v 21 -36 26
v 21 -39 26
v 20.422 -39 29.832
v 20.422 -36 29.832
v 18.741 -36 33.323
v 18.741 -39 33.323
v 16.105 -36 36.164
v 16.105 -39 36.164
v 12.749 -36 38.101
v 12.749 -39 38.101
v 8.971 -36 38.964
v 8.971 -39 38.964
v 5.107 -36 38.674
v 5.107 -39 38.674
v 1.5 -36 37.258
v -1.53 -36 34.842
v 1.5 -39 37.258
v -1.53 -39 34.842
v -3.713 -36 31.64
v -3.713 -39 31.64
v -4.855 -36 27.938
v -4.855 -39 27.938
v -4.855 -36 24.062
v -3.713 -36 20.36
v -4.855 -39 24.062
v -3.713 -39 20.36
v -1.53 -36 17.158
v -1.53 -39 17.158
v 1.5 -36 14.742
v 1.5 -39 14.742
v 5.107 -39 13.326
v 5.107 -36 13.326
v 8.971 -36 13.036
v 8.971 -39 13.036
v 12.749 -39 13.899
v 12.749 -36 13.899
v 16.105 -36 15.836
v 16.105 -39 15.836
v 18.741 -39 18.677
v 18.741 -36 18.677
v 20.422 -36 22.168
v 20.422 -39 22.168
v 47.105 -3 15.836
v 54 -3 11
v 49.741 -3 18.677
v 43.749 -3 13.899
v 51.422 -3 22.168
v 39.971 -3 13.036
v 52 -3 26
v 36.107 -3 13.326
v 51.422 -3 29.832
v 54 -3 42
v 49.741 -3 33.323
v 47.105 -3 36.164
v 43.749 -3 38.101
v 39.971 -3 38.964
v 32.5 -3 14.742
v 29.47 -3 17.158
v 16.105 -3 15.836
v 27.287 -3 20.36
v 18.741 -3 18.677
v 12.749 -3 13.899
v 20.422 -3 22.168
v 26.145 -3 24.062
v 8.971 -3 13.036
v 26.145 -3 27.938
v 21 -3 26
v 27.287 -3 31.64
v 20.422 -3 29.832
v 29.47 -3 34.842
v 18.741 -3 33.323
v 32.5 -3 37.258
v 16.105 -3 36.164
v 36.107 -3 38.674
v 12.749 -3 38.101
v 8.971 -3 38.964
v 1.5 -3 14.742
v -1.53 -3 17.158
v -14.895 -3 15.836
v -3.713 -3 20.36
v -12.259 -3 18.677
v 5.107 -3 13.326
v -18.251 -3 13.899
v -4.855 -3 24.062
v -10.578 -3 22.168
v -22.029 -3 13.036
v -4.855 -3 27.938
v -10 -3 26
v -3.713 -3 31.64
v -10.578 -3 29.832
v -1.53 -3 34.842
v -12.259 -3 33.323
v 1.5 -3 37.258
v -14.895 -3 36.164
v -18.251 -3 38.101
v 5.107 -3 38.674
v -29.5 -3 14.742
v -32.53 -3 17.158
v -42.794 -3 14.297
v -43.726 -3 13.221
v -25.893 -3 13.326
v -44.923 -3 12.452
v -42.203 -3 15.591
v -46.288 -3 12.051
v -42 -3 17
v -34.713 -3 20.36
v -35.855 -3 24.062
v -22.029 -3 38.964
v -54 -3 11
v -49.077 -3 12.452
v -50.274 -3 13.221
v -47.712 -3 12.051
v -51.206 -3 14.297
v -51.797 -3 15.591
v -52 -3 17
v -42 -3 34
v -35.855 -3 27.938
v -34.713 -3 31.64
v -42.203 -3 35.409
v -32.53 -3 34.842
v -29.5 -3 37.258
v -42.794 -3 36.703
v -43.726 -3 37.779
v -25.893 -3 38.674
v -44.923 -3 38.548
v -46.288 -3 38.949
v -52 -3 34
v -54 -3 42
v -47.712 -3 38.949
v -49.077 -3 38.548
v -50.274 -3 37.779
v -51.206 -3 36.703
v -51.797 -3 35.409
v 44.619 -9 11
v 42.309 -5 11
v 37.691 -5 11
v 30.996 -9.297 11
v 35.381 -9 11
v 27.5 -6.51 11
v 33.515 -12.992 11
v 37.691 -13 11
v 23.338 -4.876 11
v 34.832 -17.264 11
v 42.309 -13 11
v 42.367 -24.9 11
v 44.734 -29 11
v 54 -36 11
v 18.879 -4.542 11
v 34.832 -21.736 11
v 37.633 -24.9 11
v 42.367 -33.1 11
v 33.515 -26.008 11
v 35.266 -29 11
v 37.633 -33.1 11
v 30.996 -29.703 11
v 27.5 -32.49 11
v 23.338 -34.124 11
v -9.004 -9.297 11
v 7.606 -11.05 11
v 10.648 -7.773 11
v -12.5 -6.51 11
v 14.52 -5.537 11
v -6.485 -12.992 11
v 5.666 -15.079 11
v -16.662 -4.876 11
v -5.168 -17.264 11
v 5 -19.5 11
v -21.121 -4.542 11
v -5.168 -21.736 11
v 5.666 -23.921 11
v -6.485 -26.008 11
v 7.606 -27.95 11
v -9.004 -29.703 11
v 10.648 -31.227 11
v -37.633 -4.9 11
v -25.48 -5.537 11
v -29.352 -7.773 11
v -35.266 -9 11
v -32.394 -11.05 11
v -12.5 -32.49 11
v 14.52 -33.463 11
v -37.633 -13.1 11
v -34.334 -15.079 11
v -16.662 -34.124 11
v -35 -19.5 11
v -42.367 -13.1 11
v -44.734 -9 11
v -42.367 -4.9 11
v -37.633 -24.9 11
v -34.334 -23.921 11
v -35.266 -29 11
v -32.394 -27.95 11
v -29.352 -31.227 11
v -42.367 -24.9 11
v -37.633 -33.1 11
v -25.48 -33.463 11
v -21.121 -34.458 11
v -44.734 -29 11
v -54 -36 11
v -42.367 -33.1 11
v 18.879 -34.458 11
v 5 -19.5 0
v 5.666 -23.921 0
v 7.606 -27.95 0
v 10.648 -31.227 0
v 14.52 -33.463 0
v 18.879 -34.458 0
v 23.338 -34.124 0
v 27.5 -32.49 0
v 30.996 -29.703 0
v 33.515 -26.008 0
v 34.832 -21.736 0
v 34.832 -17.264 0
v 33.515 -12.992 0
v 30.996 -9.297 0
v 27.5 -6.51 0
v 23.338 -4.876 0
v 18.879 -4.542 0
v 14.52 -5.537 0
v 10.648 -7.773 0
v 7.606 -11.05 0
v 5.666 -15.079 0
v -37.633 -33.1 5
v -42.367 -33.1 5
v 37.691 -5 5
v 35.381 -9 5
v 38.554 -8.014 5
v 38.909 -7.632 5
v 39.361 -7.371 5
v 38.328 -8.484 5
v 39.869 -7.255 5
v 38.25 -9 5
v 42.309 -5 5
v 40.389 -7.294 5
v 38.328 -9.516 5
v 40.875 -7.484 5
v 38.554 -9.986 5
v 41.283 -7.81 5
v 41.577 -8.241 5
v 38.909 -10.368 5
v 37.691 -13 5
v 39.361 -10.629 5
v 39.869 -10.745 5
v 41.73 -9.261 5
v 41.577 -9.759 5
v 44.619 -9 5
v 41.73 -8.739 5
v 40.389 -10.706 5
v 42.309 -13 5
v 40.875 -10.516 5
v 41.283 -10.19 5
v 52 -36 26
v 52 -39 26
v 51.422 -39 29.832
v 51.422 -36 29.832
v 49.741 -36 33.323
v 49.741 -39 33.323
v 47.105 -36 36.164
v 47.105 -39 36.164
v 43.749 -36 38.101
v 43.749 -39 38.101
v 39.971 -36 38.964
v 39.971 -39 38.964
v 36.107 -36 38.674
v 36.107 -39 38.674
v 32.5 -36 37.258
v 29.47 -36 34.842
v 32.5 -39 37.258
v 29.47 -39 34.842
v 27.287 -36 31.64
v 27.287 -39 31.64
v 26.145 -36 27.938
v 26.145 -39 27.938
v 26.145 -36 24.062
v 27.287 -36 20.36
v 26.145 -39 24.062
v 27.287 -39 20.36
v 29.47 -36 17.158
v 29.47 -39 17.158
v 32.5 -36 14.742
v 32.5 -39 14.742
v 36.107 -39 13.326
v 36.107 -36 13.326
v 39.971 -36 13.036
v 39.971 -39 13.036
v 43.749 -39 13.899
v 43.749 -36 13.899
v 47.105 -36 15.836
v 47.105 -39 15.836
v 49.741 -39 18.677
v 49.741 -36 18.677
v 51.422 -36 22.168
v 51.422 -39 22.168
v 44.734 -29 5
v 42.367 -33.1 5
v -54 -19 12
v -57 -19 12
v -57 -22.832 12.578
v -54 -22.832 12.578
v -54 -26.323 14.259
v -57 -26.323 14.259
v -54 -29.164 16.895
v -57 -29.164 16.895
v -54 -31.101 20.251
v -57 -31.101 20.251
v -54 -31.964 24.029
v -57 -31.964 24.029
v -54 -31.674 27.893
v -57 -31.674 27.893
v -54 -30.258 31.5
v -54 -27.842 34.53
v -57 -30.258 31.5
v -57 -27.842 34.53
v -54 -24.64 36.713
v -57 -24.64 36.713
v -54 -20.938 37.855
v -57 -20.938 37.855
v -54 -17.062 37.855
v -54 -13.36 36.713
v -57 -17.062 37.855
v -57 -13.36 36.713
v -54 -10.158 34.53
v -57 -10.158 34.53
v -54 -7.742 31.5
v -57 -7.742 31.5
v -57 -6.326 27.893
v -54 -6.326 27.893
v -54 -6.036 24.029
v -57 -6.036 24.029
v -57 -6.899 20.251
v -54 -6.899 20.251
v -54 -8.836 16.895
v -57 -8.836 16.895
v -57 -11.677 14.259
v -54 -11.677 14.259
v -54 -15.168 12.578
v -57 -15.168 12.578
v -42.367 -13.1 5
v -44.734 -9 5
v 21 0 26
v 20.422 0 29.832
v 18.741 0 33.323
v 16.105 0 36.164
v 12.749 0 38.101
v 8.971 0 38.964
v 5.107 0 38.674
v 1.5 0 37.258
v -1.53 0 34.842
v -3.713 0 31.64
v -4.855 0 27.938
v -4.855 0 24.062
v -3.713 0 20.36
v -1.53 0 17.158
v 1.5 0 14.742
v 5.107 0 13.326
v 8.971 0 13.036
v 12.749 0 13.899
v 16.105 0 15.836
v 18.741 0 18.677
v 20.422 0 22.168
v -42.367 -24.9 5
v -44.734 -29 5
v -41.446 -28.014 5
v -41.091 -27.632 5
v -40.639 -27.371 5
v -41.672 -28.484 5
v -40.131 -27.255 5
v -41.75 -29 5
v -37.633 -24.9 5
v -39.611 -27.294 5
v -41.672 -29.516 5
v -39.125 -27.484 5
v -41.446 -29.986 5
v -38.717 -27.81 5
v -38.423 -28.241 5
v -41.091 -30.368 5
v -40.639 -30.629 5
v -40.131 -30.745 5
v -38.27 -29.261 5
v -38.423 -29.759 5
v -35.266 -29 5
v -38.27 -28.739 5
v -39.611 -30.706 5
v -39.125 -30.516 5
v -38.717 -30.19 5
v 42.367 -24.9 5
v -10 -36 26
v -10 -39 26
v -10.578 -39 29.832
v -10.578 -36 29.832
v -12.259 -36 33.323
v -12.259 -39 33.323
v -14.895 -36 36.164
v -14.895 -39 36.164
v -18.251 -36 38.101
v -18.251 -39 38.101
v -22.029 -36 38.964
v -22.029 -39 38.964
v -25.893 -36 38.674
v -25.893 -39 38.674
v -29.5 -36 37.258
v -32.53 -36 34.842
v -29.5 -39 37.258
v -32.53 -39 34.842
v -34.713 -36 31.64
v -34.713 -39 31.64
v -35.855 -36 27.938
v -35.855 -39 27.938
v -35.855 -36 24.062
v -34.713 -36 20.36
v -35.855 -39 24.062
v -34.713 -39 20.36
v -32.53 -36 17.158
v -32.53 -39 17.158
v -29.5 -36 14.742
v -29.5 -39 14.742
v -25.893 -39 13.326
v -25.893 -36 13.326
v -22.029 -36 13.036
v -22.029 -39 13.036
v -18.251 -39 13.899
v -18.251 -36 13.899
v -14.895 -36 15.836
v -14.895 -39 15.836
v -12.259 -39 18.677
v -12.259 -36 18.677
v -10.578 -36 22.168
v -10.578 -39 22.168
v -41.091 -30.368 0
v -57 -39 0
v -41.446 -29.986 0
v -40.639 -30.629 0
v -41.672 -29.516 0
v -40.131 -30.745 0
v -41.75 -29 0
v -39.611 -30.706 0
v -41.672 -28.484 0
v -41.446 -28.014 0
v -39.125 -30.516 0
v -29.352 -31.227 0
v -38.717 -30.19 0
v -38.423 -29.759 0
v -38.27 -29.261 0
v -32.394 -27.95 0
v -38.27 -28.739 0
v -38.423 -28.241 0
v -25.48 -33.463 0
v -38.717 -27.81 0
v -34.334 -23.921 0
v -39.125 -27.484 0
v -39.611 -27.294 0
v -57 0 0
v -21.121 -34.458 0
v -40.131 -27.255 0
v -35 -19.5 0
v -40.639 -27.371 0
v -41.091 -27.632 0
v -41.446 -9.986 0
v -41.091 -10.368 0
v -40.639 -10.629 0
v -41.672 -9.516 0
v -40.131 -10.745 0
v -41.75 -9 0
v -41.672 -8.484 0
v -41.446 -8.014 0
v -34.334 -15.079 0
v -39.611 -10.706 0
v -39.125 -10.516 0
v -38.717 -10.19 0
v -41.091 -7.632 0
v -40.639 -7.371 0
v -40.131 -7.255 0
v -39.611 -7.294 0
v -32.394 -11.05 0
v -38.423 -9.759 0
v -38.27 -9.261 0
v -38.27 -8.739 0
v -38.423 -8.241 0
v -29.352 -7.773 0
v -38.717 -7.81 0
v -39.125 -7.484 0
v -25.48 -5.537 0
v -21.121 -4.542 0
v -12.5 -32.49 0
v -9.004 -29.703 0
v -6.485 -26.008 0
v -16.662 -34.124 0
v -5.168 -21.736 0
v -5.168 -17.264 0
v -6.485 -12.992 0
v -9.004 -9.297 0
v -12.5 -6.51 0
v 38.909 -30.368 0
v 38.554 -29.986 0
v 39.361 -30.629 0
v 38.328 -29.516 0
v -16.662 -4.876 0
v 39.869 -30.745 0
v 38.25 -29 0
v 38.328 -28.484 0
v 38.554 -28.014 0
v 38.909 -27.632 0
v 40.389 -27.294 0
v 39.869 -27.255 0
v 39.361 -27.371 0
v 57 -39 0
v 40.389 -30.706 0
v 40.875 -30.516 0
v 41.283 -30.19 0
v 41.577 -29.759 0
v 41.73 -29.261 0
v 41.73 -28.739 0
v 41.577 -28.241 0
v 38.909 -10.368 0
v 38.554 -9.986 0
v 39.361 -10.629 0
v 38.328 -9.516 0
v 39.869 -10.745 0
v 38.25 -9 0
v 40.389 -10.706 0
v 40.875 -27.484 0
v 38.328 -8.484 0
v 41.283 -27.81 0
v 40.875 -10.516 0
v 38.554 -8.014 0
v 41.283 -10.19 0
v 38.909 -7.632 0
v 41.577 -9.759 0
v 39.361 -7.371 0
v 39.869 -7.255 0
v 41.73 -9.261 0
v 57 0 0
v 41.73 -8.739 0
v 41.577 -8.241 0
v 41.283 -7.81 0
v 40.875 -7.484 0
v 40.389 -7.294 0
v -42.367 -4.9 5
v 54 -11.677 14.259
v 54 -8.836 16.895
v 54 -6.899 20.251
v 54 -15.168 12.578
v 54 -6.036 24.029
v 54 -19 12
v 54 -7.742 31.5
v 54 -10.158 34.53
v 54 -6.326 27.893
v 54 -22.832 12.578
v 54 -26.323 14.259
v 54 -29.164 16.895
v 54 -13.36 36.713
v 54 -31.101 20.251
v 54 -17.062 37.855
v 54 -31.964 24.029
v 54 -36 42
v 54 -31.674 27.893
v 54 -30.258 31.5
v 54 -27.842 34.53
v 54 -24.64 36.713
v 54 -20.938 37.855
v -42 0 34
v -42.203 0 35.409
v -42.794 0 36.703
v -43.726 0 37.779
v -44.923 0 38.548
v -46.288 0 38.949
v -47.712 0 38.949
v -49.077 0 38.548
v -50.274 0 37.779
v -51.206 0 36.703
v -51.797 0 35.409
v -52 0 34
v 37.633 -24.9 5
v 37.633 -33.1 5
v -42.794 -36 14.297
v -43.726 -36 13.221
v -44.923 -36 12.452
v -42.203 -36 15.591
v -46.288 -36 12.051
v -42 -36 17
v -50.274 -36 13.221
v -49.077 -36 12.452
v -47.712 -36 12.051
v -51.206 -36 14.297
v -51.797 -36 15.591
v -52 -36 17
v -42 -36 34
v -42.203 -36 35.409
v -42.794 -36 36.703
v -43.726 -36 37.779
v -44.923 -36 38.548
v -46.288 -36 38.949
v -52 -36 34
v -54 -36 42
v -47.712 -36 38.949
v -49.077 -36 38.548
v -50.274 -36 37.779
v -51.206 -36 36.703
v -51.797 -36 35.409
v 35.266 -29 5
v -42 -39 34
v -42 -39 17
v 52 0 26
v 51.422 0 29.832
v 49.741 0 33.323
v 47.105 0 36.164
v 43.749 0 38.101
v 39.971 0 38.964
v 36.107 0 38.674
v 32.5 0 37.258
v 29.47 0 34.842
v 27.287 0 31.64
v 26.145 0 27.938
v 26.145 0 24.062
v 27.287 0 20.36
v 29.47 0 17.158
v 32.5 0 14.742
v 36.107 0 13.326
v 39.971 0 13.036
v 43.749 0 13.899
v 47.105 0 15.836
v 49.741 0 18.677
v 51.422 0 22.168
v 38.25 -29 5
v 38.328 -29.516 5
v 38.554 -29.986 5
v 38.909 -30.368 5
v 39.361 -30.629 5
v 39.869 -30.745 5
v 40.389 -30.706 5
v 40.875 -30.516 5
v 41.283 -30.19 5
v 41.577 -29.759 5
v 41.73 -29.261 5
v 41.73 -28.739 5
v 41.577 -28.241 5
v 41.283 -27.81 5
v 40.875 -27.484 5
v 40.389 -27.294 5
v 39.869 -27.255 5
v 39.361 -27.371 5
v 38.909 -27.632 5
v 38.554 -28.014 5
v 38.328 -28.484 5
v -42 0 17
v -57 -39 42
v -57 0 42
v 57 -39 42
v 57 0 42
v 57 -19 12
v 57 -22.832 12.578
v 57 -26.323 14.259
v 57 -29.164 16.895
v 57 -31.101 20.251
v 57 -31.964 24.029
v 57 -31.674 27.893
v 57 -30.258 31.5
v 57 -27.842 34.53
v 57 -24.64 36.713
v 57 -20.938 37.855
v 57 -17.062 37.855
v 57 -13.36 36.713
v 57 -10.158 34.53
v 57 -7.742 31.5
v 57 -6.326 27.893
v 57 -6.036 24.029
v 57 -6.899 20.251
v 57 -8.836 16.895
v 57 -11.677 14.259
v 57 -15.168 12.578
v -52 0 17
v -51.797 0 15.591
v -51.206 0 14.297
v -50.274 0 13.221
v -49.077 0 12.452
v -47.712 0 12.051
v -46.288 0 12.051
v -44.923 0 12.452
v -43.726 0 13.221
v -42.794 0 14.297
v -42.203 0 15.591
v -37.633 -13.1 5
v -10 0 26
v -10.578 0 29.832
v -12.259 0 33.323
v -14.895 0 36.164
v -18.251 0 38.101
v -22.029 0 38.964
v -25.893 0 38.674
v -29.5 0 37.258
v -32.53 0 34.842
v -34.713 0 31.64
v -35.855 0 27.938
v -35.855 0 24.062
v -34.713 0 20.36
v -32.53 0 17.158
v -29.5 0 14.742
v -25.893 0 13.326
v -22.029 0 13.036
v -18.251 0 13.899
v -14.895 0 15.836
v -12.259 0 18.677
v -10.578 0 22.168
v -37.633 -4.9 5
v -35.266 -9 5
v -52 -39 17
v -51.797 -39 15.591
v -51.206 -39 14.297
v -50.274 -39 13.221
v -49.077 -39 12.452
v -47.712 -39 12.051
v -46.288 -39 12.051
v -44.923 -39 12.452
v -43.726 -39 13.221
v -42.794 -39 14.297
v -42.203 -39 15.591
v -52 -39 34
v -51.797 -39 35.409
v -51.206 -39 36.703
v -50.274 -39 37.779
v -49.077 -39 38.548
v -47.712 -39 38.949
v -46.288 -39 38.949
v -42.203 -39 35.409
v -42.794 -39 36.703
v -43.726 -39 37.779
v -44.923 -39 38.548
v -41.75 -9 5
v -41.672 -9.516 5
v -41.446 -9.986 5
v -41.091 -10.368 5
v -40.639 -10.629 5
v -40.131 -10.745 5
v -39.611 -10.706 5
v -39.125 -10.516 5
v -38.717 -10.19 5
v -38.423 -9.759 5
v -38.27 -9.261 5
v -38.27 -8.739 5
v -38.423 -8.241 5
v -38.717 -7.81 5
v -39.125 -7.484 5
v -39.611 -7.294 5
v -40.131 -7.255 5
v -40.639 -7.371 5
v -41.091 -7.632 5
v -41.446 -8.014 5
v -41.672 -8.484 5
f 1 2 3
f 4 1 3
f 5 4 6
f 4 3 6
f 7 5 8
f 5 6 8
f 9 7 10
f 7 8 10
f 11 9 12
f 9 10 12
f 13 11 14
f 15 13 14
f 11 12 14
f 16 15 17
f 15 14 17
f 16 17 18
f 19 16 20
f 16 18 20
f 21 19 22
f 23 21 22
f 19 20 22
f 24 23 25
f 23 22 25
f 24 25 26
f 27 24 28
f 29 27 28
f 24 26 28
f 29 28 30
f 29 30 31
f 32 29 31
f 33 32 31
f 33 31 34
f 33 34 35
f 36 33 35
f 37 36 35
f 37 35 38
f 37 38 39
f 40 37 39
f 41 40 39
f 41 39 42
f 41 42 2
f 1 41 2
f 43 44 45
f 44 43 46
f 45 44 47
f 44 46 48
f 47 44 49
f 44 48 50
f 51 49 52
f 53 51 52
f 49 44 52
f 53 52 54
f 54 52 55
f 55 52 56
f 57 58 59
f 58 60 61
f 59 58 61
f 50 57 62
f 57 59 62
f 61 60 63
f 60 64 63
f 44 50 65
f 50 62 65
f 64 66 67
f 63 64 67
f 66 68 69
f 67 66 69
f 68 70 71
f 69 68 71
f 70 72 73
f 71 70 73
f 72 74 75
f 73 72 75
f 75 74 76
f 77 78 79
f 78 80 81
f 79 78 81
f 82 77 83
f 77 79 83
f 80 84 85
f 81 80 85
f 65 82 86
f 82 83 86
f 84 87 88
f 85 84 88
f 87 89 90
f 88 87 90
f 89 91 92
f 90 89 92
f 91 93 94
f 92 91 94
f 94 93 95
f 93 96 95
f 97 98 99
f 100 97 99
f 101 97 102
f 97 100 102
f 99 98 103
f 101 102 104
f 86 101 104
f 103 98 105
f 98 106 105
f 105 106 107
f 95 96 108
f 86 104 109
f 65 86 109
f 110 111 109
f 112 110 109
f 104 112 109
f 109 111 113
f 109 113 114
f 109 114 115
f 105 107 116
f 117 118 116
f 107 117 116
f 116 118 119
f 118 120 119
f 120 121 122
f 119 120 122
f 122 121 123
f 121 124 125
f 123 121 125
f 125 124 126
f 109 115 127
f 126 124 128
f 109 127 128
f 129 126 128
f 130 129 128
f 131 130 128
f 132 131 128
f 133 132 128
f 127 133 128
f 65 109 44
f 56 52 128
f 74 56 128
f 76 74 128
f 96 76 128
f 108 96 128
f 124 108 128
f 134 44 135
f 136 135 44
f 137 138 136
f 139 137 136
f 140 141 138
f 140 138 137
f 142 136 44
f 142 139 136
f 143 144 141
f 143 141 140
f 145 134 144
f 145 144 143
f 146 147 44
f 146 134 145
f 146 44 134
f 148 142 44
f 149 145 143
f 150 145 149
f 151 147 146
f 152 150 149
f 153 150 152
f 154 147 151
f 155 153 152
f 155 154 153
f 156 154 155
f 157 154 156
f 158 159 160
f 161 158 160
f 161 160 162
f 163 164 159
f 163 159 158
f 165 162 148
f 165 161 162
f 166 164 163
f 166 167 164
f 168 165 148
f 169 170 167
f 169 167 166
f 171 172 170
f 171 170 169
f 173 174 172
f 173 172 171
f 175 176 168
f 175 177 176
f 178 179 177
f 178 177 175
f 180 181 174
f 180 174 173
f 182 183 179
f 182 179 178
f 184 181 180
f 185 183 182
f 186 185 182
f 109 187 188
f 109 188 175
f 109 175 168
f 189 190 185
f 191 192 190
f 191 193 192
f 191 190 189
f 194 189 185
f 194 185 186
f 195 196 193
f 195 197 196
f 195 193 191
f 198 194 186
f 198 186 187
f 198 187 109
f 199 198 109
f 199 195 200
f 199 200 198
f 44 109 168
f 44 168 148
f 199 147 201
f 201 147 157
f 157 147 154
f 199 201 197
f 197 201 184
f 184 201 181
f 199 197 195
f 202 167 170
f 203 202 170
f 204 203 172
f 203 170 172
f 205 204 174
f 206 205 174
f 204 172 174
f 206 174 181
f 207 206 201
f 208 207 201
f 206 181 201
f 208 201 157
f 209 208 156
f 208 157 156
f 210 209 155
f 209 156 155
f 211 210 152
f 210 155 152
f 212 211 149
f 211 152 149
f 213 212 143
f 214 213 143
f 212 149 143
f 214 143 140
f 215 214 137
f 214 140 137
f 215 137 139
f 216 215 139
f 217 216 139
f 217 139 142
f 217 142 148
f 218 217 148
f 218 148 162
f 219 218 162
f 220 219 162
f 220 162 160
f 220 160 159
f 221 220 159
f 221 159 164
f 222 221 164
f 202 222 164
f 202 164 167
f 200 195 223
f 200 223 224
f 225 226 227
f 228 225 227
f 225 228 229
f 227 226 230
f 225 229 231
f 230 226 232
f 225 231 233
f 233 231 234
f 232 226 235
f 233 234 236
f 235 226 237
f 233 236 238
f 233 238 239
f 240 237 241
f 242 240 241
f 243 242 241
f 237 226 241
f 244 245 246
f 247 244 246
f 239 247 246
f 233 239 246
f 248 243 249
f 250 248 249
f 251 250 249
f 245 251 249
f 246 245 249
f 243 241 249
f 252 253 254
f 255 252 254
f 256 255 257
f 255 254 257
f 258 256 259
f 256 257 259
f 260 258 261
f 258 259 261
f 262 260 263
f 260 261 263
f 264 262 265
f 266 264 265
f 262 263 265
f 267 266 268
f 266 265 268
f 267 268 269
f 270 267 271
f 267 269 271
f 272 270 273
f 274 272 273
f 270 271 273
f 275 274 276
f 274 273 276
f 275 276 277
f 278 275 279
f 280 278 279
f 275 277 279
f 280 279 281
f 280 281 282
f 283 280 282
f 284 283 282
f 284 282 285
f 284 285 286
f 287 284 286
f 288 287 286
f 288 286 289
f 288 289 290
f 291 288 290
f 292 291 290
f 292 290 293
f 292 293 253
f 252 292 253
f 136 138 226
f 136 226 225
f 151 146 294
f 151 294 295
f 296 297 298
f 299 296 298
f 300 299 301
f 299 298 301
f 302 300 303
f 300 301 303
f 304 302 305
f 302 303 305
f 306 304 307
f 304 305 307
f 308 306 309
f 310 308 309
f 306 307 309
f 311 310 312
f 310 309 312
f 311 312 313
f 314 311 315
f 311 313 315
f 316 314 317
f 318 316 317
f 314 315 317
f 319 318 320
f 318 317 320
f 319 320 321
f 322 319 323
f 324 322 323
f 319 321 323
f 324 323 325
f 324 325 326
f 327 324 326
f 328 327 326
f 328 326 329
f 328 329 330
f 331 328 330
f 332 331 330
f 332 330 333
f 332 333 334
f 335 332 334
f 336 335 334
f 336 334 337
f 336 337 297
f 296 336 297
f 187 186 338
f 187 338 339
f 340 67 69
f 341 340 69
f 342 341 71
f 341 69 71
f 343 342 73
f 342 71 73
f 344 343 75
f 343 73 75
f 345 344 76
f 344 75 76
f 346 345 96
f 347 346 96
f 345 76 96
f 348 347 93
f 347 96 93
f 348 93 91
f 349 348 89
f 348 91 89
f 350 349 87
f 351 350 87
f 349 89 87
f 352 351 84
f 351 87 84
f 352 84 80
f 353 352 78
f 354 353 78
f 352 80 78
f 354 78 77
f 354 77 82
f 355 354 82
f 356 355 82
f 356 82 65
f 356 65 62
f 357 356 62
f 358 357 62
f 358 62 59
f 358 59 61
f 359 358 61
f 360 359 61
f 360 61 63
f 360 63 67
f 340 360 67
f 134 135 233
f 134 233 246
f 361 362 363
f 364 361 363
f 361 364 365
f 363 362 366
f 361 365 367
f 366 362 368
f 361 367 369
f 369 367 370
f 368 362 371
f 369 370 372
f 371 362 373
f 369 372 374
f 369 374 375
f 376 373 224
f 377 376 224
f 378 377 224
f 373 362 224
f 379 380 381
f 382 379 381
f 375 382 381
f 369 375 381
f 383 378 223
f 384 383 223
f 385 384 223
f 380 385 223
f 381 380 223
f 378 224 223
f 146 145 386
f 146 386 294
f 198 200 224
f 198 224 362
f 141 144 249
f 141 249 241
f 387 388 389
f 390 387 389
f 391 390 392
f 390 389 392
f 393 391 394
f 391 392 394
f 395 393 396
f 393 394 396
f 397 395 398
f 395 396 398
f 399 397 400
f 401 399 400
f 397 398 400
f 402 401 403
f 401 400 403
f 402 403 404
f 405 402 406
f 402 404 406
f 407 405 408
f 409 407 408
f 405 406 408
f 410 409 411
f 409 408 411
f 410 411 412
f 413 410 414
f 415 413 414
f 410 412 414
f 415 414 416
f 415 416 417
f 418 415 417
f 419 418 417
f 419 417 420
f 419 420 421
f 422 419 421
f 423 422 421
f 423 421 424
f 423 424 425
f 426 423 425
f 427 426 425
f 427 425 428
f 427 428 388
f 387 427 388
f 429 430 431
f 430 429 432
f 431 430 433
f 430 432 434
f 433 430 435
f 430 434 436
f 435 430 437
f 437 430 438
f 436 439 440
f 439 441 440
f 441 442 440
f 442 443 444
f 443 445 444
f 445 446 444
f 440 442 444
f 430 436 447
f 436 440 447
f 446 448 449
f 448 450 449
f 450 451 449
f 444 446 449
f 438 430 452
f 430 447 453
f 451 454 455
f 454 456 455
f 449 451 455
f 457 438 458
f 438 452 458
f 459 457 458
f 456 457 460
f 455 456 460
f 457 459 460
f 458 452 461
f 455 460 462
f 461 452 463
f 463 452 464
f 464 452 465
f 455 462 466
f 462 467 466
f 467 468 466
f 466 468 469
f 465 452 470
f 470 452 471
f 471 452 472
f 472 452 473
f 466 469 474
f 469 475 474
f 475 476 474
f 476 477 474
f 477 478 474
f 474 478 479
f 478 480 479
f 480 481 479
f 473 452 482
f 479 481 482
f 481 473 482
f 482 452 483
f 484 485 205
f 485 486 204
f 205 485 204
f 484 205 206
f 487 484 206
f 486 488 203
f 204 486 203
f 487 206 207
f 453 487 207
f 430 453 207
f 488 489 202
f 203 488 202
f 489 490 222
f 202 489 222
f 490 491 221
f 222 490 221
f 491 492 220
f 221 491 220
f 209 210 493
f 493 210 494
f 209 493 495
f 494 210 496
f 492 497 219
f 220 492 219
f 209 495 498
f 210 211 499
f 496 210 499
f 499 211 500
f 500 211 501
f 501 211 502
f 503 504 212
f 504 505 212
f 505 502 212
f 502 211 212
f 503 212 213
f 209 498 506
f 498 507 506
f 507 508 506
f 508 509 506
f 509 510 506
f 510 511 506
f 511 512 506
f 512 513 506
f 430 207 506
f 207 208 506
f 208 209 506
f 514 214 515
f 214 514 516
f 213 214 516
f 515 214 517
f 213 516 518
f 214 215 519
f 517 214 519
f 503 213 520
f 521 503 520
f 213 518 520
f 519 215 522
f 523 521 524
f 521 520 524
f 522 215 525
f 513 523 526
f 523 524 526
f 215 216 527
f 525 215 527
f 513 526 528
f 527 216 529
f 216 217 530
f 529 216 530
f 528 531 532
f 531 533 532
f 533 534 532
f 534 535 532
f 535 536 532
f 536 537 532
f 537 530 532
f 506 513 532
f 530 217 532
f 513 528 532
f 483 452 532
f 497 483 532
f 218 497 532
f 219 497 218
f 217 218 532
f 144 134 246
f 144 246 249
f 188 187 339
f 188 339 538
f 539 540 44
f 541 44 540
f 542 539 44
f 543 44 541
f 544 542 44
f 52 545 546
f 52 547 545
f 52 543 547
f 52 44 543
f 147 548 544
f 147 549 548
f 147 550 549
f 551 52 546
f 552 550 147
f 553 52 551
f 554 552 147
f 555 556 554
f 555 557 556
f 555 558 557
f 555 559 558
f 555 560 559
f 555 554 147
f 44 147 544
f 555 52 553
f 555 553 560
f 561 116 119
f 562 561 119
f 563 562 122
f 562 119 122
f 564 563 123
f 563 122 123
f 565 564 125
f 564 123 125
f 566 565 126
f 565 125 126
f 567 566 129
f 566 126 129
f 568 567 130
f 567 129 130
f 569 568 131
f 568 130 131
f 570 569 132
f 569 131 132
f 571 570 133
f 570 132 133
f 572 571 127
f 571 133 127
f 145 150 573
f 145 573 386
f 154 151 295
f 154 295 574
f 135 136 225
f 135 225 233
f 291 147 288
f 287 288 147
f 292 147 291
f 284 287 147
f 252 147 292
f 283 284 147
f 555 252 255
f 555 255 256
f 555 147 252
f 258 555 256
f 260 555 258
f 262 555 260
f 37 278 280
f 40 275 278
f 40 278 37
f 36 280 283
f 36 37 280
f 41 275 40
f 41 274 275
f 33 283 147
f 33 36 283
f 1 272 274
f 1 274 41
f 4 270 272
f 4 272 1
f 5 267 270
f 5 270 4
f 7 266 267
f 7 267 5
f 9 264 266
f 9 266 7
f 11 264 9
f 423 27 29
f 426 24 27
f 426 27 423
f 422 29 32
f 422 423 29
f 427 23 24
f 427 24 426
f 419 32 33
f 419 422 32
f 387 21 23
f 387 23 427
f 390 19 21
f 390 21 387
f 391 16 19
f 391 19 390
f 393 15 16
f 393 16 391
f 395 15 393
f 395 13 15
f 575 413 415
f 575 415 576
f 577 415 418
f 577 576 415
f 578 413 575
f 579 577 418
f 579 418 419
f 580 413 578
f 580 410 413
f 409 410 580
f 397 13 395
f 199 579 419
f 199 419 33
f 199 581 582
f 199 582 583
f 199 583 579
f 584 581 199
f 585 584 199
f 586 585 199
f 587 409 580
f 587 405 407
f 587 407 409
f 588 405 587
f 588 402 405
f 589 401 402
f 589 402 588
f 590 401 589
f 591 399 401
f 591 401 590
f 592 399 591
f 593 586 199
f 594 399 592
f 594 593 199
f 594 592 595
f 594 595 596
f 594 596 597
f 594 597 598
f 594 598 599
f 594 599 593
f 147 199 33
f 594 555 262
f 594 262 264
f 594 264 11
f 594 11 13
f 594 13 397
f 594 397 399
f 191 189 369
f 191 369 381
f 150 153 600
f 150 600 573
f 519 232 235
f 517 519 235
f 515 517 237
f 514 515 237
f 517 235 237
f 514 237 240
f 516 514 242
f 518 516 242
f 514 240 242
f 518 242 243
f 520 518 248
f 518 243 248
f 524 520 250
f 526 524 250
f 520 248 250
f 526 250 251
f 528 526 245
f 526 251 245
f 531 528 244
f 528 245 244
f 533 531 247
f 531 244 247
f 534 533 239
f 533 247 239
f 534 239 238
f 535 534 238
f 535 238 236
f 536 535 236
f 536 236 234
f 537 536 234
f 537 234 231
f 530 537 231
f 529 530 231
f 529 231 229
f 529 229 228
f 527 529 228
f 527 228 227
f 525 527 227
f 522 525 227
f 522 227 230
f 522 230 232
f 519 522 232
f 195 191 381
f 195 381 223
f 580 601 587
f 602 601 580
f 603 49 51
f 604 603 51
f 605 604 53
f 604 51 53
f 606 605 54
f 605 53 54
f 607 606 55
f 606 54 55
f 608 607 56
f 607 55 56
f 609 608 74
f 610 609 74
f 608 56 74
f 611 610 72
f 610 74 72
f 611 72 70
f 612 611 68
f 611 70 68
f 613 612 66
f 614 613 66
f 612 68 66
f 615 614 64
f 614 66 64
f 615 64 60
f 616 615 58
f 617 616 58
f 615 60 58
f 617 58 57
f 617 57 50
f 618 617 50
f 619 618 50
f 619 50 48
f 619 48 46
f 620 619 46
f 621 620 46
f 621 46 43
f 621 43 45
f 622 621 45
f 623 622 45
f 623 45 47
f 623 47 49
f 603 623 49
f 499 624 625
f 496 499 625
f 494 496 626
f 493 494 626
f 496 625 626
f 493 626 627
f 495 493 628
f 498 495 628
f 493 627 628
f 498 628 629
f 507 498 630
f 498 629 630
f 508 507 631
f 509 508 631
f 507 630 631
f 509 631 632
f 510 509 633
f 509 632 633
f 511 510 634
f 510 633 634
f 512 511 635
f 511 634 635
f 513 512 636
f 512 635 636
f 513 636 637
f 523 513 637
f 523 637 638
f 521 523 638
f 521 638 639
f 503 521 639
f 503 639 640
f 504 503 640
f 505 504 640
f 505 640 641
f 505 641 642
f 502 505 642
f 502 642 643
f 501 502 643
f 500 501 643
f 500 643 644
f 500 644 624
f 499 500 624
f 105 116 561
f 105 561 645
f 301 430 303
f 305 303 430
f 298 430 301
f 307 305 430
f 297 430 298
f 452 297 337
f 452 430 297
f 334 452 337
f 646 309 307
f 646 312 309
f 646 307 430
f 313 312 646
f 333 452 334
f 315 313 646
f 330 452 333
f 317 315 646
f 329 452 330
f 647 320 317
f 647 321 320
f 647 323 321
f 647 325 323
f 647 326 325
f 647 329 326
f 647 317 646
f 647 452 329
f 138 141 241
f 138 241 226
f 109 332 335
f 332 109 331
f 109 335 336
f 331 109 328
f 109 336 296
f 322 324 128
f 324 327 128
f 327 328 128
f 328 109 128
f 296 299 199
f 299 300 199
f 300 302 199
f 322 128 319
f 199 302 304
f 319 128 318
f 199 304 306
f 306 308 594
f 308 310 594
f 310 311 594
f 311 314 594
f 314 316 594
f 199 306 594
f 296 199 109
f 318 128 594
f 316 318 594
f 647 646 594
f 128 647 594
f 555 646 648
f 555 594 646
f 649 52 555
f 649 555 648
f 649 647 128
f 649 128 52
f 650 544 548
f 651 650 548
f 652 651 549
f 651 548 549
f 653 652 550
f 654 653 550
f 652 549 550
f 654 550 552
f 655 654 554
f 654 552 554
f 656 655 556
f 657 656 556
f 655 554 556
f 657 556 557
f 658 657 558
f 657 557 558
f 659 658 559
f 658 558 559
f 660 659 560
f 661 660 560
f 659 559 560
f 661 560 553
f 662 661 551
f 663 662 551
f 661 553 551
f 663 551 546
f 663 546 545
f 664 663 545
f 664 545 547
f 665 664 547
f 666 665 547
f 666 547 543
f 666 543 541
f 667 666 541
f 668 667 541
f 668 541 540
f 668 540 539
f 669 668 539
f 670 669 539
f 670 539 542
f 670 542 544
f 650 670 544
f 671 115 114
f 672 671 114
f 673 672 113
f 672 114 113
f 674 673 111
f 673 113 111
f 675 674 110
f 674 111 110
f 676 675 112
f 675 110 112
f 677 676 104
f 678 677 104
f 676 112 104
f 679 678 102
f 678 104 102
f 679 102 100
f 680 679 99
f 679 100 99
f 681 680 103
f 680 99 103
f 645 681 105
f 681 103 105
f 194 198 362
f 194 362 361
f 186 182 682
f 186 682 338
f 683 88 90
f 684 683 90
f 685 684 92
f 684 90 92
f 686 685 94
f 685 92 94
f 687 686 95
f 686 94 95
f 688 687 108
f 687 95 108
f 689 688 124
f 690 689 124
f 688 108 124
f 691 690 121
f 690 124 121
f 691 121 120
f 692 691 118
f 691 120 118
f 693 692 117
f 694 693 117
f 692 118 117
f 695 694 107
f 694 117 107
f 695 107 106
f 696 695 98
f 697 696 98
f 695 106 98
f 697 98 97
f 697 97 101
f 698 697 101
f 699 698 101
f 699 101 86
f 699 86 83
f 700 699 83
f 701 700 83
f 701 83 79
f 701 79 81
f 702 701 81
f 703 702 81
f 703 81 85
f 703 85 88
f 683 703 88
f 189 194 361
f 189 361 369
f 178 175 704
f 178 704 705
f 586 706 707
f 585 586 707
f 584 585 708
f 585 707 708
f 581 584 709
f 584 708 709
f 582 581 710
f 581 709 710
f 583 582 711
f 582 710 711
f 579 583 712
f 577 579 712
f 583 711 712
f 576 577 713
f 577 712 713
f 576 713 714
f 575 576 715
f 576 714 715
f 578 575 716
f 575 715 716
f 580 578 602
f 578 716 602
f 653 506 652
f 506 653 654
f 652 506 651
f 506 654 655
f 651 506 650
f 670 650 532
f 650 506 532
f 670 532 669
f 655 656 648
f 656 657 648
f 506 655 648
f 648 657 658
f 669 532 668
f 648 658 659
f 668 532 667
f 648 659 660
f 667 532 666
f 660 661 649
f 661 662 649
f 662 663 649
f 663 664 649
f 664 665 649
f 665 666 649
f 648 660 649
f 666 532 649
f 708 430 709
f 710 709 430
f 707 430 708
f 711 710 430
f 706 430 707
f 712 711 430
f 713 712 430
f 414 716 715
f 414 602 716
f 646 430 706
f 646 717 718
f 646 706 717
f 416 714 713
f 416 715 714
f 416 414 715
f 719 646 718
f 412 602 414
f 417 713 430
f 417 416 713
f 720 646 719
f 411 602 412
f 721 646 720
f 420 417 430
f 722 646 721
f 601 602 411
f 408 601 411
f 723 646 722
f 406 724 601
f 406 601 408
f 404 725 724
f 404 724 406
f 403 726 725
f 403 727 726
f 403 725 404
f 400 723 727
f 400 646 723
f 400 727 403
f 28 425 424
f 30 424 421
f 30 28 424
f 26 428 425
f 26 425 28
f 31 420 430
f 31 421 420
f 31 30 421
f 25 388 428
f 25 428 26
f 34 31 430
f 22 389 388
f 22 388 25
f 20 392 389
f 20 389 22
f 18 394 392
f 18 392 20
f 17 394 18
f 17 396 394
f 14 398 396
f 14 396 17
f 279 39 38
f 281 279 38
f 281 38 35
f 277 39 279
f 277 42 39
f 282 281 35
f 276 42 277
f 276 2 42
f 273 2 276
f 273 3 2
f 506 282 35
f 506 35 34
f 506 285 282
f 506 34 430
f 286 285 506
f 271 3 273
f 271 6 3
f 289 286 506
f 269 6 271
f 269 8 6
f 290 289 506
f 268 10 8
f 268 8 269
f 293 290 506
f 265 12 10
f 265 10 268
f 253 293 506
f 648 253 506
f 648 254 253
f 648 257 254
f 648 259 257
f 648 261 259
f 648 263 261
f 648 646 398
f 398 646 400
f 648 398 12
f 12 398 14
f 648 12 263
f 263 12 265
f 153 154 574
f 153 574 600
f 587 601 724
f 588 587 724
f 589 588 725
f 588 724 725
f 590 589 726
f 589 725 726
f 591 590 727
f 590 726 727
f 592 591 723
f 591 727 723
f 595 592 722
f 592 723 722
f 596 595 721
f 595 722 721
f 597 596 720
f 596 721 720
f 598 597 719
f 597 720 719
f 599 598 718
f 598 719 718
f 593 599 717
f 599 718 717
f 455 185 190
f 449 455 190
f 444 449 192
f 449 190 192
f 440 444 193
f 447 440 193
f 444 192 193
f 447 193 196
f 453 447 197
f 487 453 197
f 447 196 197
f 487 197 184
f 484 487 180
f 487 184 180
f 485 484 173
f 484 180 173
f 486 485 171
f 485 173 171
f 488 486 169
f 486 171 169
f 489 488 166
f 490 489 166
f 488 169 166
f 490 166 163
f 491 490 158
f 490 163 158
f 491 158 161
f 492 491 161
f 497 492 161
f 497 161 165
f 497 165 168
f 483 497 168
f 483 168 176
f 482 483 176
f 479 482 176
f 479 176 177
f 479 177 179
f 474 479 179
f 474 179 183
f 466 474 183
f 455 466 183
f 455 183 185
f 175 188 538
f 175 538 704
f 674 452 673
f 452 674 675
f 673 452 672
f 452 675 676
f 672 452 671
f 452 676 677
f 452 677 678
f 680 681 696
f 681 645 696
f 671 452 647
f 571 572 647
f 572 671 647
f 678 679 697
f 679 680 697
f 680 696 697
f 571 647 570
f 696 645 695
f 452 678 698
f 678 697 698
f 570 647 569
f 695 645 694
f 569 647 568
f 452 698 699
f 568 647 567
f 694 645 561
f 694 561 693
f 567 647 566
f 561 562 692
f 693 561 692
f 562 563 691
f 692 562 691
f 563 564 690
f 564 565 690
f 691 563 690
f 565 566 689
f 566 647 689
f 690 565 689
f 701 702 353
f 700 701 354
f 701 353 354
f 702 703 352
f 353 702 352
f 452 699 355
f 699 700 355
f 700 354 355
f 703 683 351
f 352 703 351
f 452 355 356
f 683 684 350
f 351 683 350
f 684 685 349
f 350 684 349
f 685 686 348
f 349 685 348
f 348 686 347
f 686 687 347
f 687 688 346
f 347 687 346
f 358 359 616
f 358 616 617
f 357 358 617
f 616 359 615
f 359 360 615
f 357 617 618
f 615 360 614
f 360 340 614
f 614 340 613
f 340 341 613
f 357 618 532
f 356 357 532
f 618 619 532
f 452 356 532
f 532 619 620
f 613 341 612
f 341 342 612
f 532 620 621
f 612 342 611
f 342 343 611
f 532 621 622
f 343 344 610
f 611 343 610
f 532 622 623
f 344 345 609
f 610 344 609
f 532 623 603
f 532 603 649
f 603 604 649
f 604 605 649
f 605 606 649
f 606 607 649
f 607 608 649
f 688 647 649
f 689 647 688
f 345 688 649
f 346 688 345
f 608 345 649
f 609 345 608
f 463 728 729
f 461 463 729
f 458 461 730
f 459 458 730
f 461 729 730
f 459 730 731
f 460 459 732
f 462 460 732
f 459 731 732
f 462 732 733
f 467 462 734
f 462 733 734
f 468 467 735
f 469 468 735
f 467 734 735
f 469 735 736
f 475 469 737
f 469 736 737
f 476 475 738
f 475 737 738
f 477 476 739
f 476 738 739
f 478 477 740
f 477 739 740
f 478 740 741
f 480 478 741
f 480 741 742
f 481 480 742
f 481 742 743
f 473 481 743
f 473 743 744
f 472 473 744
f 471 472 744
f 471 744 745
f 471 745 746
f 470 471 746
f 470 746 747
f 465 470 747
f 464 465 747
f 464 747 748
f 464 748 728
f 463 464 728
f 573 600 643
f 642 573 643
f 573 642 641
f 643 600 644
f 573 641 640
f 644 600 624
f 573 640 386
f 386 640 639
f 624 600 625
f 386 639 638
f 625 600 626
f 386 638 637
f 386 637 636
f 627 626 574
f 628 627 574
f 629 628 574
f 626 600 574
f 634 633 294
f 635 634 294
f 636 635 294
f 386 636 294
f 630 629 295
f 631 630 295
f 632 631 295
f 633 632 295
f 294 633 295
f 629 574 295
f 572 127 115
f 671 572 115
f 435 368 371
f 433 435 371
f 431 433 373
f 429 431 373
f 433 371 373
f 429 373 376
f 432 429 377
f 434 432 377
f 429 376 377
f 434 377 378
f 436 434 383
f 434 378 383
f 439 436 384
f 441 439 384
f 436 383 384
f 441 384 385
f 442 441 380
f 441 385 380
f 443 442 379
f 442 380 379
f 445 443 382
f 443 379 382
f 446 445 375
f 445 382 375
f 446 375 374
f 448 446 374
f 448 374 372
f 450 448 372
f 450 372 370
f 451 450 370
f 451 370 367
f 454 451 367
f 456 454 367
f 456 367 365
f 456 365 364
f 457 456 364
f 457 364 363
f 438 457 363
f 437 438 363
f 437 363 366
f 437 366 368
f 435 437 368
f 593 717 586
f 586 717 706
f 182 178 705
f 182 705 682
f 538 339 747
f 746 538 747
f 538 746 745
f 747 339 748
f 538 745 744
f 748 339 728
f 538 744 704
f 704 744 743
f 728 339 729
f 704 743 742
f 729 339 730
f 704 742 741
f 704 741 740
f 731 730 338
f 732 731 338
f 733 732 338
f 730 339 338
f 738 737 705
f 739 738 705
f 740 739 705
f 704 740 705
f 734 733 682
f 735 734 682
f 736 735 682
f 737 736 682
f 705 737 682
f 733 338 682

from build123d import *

# Parameters (mm, degrees)
SKETCH_W        = 114
SKETCH_H        = 42
PAD_DEPTH       = 39
SKETCH005_W     = 108
SKETCH005_H     = 33
POCKET_DEPTH    = 31
SKETCH007_R     = 13
POCKET001_DEPTH = 39.001
SKETCH006_R     = 1.75
SKETCH006_R_2   = 15
POCKET002_DEPTH = 11.001
POCKET003_DEPTH = 6
POCKET004_DEPTH = 6
SKETCH008_R     = 13
POCKET005_DEPTH = 114.001


with BuildPart() as part:
    # Sketch → Pad (new body)
    with BuildSketch(Plane.XZ):
        with Locations((0, 21)):
            Rectangle(SKETCH_W, SKETCH_H)
    extrude(amount=PAD_DEPTH)

    # Sketch005 → Pocket (cut)
    with BuildSketch(Plane(origin=(0, 0, 42), x_dir=(-1, 0, 0), z_dir=(0, 0, 1))):
        with Locations((0, 19.5)):
            Rectangle(SKETCH005_W, SKETCH005_H)
    extrude(amount=-POCKET_DEPTH, mode=Mode.SUBTRACT)

    # Sketch007 → Pocket001 (cut, through all)
    with BuildSketch(Plane.XZ.offset(39)):
        with Locations((-23, 26)):
            Circle(SKETCH007_R)
        with Locations((8, 26)):
            Circle(SKETCH007_R)
        with Locations((39, 26)):
            Circle(SKETCH007_R)
        with BuildLine():
            ThreePointArc((-42, 33.999986), (-47, 39), (-52, 33.999986))
            Line((-52, 33.999986), (-52, 17.000019))
            ThreePointArc((-52, 17.000019), (-47, 12), (-42, 17.000019))
            Line((-42, 33.999986), (-42, 17.000019))
        make_face()
    extrude(amount=-POCKET001_DEPTH, mode=Mode.SUBTRACT)

    # Sketch006 → Pocket002 (cut, through all)
    with BuildSketch(Plane(origin=(0, 0, 11), x_dir=(-1, 0, 0), z_dir=(0, 0, 1))):
        with Locations((-40, 29)):
            Circle(SKETCH006_R)
        with Locations((40, 29)):
            Circle(SKETCH006_R)
        with Locations((-40, 9)):
            Circle(SKETCH006_R)
        with Locations((40, 9)):
            Circle(SKETCH006_R)
        with Locations((-20, 19.5)):
            Circle(SKETCH006_R_2)
        with Locations((20, 19.5)):
            Circle(SKETCH006_R_2)
    extrude(amount=-POCKET002_DEPTH, mode=Mode.SUBTRACT)

    # Sketch010 → Pocket003 (cut)
    with BuildSketch(Plane(origin=(0, 0, 11), x_dir=(-1, 0, 0), z_dir=(0, 0, 1))):
        Polygon((-42.309401, 13), (-37.690599, 13), (-35.381198, 9), (-37.690599, 5), (-42.309401, 5), (-44.618802, 9), align=None)
    extrude(amount=-POCKET003_DEPTH, mode=Mode.SUBTRACT)

    # Sketch011 → Pocket004 (cut)
    with BuildSketch(Plane(origin=(0, 0, 11), x_dir=(-1, 0, 0), z_dir=(0, 0, 1))):
        Polygon((-42.367136, 33.1), (-37.632864, 33.1), (-35.265728, 29), (-37.632864, 24.9), (-42.367136, 24.9), (-44.734272, 29), align=None)
        Polygon((37.632864, 33.1), (42.367136, 33.1), (44.734272, 29), (42.367136, 24.9), (37.632864, 24.9), (35.265728, 29), align=None)
        Polygon((37.632864, 13.1), (42.367136, 13.1), (44.734272, 9), (42.367136, 4.9), (37.632864, 4.9), (35.265728, 9), align=None)
    extrude(amount=-POCKET004_DEPTH, mode=Mode.SUBTRACT)

    # Sketch008 → Pocket005 (cut, through all)
    with BuildSketch(Plane(origin=(-57, 0, 0), x_dir=(0, 0, -1), z_dir=(-1, 0, 0))):
        with Locations((-25, 19)):
            Circle(SKETCH008_R)
    extrude(amount=-POCKET005_DEPTH, mode=Mode.SUBTRACT)


solid = part.part
